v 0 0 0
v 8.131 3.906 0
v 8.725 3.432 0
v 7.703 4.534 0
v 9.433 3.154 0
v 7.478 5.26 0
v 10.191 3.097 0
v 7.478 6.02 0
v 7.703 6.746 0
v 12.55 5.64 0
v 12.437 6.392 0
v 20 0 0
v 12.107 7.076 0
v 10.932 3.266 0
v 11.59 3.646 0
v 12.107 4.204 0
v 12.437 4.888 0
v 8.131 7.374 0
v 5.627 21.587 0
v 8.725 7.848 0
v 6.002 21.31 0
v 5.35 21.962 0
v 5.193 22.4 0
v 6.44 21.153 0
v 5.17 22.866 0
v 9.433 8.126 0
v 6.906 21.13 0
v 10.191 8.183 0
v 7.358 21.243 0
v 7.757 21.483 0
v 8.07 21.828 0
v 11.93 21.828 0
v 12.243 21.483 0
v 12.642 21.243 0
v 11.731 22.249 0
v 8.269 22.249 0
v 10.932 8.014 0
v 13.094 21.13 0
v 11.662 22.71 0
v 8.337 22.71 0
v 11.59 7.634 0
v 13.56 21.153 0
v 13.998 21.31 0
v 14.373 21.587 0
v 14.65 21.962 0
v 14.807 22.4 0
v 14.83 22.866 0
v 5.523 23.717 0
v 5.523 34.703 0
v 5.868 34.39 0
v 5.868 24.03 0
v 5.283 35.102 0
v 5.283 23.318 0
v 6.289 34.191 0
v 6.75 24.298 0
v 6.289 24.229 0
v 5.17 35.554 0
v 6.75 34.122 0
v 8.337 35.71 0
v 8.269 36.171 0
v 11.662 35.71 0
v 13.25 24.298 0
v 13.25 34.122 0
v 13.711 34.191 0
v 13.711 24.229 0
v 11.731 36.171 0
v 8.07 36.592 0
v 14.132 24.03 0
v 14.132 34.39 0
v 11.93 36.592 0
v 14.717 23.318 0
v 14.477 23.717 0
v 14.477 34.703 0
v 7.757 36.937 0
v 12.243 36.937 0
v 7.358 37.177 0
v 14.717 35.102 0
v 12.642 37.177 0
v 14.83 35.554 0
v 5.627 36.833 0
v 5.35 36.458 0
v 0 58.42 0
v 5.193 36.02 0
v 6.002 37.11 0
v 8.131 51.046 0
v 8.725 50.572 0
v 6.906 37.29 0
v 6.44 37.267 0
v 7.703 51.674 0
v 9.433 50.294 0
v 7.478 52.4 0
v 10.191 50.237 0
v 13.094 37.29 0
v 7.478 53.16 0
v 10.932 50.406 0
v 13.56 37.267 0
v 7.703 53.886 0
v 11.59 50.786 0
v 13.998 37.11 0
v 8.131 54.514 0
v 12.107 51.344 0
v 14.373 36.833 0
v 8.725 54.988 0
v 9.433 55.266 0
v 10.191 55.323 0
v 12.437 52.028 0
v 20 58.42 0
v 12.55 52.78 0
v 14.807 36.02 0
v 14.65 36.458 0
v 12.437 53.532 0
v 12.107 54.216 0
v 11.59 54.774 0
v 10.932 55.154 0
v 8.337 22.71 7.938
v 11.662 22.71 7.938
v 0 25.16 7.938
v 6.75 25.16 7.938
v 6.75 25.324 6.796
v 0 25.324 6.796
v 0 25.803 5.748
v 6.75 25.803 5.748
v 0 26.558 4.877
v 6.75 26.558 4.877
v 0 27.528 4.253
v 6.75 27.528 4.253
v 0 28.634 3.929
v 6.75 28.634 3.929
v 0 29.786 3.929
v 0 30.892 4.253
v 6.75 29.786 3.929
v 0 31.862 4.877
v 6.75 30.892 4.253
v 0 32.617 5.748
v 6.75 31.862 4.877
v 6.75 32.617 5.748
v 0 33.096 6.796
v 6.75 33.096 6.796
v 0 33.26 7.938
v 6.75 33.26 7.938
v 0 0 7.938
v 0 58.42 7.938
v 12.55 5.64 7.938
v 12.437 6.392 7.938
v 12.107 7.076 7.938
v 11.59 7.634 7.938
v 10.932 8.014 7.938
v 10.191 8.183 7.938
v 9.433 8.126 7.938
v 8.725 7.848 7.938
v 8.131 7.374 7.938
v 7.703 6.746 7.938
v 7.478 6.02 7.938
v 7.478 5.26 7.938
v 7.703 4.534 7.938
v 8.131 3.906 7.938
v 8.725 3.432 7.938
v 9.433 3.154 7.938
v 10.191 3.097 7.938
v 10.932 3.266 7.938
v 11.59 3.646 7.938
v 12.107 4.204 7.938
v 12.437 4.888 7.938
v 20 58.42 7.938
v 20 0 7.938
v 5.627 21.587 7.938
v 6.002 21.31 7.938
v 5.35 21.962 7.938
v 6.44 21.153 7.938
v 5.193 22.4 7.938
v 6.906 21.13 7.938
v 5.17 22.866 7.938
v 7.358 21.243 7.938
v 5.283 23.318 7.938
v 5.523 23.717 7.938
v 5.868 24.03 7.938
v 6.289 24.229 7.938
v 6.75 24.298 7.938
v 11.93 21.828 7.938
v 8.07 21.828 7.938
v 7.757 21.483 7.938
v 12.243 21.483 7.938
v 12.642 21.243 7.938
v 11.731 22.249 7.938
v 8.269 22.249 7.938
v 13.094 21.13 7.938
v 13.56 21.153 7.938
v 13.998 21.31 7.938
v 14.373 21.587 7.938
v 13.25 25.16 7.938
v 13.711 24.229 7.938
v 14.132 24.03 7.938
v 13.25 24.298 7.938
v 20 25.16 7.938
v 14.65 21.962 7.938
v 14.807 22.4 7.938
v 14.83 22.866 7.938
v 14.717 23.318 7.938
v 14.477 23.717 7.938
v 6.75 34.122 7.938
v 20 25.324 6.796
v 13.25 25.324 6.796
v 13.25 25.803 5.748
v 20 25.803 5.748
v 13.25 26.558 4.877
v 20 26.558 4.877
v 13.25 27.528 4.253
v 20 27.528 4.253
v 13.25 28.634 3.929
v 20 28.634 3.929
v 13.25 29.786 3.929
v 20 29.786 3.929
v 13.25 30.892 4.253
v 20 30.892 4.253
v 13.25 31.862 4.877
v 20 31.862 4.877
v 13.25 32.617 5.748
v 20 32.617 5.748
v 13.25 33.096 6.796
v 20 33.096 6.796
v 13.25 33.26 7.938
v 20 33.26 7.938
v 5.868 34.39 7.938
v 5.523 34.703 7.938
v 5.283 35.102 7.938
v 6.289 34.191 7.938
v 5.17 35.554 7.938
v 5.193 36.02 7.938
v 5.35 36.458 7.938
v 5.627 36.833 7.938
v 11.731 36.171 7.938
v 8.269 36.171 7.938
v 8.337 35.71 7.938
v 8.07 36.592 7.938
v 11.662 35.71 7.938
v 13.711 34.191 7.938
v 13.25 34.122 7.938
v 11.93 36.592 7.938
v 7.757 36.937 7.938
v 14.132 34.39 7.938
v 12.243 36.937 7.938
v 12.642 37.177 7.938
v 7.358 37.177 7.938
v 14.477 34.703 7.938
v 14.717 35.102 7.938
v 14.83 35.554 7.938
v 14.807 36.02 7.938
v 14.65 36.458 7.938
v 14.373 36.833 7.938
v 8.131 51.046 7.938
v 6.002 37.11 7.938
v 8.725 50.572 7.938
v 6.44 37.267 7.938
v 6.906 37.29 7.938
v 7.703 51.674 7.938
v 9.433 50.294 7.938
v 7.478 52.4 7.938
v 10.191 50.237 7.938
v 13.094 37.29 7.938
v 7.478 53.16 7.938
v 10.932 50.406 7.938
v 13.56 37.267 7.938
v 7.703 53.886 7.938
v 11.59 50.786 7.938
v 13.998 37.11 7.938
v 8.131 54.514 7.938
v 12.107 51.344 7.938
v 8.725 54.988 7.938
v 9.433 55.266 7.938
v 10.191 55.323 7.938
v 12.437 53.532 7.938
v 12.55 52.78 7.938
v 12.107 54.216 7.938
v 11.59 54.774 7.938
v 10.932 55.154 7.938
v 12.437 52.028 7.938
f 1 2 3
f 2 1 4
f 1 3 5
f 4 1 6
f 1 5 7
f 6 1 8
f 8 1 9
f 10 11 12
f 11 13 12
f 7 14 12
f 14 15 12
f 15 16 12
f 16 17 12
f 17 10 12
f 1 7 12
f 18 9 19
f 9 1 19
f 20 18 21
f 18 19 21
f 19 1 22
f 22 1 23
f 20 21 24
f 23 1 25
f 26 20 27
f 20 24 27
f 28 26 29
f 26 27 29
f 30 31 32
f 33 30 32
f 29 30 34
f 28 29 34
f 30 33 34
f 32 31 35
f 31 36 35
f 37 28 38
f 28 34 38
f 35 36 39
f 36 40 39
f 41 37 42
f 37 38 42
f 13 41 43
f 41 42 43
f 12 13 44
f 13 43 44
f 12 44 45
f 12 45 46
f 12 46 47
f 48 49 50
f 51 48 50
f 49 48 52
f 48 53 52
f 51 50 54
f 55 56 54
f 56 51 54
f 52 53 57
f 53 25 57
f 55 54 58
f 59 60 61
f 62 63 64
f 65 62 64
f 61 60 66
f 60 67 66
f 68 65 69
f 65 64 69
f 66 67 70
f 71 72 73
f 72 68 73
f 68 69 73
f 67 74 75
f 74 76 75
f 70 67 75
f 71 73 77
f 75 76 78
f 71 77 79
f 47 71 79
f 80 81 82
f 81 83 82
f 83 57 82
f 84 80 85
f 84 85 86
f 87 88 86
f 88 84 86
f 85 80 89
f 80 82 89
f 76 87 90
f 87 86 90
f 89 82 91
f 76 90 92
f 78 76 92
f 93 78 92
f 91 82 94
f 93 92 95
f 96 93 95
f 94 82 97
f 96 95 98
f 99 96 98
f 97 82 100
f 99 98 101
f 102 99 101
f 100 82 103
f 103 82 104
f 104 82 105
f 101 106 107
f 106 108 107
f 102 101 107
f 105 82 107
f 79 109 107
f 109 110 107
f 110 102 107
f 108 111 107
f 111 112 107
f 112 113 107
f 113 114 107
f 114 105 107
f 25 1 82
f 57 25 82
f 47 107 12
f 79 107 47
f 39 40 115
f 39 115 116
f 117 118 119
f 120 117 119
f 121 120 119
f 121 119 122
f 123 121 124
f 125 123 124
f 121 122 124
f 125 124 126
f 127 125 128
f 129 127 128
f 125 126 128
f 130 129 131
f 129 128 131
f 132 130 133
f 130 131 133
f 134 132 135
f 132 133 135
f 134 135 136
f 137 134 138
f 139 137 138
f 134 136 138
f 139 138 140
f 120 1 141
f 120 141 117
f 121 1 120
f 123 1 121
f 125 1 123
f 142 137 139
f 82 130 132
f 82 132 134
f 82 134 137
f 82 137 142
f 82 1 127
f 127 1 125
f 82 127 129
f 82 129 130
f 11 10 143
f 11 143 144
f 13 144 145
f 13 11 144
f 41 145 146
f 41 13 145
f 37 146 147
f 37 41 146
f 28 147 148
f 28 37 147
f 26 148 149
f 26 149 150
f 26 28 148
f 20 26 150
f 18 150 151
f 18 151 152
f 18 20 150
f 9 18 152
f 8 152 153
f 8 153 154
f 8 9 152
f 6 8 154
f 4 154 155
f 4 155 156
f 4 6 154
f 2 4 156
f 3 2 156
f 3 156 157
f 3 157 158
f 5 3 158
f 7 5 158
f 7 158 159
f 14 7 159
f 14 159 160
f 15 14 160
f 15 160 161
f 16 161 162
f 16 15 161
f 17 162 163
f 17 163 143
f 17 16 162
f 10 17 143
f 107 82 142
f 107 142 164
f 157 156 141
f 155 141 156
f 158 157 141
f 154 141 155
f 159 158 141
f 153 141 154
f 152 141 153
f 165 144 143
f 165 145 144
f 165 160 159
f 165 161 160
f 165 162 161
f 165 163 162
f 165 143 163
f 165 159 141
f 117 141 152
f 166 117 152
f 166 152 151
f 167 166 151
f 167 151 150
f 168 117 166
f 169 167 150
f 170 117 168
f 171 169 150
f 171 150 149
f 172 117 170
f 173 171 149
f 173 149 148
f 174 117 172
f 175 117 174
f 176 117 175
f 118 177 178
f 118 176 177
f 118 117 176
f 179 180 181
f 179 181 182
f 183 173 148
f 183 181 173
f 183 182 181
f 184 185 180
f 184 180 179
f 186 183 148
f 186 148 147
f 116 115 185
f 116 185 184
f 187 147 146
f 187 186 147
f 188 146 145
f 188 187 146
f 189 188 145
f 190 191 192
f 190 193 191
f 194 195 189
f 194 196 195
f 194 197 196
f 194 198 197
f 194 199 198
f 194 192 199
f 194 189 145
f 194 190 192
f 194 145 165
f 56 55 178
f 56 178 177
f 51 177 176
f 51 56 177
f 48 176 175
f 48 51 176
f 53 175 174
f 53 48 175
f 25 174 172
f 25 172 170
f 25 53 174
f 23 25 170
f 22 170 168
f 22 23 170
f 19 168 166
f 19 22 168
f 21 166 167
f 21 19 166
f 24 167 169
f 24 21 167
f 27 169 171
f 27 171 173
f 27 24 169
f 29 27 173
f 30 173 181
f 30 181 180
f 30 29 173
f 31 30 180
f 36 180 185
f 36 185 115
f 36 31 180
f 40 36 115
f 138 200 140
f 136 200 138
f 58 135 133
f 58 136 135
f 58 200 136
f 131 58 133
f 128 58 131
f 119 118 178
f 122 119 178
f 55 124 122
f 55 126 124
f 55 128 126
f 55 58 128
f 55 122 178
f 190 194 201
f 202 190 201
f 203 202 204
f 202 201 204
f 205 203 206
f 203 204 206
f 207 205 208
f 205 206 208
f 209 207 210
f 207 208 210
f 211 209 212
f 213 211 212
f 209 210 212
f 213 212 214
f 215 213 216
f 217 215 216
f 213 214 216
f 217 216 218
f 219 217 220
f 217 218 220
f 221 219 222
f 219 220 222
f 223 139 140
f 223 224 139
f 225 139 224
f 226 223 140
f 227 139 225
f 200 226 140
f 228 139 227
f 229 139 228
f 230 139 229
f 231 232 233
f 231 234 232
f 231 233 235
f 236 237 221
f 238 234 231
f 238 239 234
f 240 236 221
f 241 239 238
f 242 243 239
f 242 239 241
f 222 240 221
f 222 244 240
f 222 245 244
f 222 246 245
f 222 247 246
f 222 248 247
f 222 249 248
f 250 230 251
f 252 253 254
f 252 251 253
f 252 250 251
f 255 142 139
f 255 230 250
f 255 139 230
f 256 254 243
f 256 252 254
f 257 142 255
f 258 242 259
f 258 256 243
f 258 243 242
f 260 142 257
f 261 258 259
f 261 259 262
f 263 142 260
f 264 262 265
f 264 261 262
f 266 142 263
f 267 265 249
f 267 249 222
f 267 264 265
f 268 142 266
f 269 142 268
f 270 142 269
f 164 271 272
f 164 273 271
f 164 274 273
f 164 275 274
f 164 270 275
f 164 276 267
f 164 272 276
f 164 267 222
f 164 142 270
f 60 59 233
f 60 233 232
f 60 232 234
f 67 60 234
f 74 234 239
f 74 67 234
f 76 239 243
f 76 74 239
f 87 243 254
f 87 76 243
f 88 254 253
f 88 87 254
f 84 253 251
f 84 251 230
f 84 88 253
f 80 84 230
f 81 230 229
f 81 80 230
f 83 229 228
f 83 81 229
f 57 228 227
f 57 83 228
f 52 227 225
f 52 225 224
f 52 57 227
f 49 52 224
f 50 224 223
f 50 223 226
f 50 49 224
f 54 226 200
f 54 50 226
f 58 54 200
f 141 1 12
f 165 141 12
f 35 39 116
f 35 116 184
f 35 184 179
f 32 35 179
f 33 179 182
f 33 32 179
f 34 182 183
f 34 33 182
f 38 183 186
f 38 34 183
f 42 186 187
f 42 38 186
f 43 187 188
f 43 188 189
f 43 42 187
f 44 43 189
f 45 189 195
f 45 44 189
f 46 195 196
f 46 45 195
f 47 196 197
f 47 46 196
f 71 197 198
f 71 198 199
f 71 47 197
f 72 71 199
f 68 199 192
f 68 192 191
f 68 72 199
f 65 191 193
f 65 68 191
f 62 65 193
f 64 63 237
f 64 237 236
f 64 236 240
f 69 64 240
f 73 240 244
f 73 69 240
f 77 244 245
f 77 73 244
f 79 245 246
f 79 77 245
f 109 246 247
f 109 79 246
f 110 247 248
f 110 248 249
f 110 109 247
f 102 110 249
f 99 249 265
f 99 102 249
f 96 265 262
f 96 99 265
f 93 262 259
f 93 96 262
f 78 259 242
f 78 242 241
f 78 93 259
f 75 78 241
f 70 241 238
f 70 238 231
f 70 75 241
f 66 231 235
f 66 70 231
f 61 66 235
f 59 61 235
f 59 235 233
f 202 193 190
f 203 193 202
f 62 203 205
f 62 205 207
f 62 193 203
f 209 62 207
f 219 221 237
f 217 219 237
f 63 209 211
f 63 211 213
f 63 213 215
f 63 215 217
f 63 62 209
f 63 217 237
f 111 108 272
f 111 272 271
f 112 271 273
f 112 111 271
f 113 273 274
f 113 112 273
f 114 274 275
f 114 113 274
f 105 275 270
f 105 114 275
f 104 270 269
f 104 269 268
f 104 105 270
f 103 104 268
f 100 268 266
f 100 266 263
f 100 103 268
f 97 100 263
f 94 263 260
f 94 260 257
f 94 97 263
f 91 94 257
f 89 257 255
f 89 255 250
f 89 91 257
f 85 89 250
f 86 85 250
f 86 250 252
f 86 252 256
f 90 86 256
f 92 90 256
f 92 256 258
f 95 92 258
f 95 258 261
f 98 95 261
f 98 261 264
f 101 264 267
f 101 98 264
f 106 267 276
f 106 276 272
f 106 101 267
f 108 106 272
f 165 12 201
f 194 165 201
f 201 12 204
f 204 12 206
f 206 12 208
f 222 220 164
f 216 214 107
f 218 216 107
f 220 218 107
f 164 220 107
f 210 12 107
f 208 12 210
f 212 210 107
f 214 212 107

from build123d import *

# Parameters (mm, degrees)
SKETCH1_W           = 20
SKETCH1_H           = 58.42
SKETCH1_R           = 2.55
BOSS_EXTRUDE1_DEPTH = 7.9375
CUT_EXTRUDE1_DEPTH  = 63.256729004


with BuildPart() as part:
    # Sketch1 → Boss-Extrude1 (new body)
    with BuildSketch(Plane.XY):
        with Locations((10, 29.21)):
            Rectangle(SKETCH1_W, SKETCH1_H)
        with Locations((10, 52.78)):
            Circle(SKETCH1_R, mode=Mode.SUBTRACT)
        with Locations((10, 5.64)):
            Circle(SKETCH1_R, mode=Mode.SUBTRACT)
        with BuildLine():
            Line((13.25, 24.2975), (13.25, 34.1225))
            ThreePointArc((13.25, 34.1225), (14.372532015, 36.832532015), (11.6625, 35.71))
            Line((11.6625, 35.71), (8.3375, 35.71))
            ThreePointArc((8.3375, 35.71), (5.627467985, 36.832532015), (6.75, 34.1225))
            Line((6.75, 34.1225), (6.75, 24.2975))
            ThreePointArc((6.75, 24.2975), (5.627467985, 21.587467985), (8.3375, 22.71))
            Line((8.3375, 22.71), (11.6625, 22.71))
            ThreePointArc((11.6625, 22.71), (14.372532015, 21.587467985), (13.25, 24.2975))
        make_face(mode=Mode.SUBTRACT)
    extrude(amount=BOSS_EXTRUDE1_DEPTH)

    # Sketch2 → Cut-Extrude1 (cut, through all)
    with BuildSketch(Plane(origin=(20, 0, 0), x_dir=(0, 0, -1), z_dir=(1, 0, 0))):
        with BuildLine():
            Line((-7.9375, 33.26), (-7.9375, 25.16))
            ThreePointArc((-7.9375, 25.16), (-3.8875, 29.21), (-7.9375, 33.26))
        make_face()
    extrude(amount=-CUT_EXTRUDE1_DEPTH, mode=Mode.SUBTRACT)


solid = part.part
